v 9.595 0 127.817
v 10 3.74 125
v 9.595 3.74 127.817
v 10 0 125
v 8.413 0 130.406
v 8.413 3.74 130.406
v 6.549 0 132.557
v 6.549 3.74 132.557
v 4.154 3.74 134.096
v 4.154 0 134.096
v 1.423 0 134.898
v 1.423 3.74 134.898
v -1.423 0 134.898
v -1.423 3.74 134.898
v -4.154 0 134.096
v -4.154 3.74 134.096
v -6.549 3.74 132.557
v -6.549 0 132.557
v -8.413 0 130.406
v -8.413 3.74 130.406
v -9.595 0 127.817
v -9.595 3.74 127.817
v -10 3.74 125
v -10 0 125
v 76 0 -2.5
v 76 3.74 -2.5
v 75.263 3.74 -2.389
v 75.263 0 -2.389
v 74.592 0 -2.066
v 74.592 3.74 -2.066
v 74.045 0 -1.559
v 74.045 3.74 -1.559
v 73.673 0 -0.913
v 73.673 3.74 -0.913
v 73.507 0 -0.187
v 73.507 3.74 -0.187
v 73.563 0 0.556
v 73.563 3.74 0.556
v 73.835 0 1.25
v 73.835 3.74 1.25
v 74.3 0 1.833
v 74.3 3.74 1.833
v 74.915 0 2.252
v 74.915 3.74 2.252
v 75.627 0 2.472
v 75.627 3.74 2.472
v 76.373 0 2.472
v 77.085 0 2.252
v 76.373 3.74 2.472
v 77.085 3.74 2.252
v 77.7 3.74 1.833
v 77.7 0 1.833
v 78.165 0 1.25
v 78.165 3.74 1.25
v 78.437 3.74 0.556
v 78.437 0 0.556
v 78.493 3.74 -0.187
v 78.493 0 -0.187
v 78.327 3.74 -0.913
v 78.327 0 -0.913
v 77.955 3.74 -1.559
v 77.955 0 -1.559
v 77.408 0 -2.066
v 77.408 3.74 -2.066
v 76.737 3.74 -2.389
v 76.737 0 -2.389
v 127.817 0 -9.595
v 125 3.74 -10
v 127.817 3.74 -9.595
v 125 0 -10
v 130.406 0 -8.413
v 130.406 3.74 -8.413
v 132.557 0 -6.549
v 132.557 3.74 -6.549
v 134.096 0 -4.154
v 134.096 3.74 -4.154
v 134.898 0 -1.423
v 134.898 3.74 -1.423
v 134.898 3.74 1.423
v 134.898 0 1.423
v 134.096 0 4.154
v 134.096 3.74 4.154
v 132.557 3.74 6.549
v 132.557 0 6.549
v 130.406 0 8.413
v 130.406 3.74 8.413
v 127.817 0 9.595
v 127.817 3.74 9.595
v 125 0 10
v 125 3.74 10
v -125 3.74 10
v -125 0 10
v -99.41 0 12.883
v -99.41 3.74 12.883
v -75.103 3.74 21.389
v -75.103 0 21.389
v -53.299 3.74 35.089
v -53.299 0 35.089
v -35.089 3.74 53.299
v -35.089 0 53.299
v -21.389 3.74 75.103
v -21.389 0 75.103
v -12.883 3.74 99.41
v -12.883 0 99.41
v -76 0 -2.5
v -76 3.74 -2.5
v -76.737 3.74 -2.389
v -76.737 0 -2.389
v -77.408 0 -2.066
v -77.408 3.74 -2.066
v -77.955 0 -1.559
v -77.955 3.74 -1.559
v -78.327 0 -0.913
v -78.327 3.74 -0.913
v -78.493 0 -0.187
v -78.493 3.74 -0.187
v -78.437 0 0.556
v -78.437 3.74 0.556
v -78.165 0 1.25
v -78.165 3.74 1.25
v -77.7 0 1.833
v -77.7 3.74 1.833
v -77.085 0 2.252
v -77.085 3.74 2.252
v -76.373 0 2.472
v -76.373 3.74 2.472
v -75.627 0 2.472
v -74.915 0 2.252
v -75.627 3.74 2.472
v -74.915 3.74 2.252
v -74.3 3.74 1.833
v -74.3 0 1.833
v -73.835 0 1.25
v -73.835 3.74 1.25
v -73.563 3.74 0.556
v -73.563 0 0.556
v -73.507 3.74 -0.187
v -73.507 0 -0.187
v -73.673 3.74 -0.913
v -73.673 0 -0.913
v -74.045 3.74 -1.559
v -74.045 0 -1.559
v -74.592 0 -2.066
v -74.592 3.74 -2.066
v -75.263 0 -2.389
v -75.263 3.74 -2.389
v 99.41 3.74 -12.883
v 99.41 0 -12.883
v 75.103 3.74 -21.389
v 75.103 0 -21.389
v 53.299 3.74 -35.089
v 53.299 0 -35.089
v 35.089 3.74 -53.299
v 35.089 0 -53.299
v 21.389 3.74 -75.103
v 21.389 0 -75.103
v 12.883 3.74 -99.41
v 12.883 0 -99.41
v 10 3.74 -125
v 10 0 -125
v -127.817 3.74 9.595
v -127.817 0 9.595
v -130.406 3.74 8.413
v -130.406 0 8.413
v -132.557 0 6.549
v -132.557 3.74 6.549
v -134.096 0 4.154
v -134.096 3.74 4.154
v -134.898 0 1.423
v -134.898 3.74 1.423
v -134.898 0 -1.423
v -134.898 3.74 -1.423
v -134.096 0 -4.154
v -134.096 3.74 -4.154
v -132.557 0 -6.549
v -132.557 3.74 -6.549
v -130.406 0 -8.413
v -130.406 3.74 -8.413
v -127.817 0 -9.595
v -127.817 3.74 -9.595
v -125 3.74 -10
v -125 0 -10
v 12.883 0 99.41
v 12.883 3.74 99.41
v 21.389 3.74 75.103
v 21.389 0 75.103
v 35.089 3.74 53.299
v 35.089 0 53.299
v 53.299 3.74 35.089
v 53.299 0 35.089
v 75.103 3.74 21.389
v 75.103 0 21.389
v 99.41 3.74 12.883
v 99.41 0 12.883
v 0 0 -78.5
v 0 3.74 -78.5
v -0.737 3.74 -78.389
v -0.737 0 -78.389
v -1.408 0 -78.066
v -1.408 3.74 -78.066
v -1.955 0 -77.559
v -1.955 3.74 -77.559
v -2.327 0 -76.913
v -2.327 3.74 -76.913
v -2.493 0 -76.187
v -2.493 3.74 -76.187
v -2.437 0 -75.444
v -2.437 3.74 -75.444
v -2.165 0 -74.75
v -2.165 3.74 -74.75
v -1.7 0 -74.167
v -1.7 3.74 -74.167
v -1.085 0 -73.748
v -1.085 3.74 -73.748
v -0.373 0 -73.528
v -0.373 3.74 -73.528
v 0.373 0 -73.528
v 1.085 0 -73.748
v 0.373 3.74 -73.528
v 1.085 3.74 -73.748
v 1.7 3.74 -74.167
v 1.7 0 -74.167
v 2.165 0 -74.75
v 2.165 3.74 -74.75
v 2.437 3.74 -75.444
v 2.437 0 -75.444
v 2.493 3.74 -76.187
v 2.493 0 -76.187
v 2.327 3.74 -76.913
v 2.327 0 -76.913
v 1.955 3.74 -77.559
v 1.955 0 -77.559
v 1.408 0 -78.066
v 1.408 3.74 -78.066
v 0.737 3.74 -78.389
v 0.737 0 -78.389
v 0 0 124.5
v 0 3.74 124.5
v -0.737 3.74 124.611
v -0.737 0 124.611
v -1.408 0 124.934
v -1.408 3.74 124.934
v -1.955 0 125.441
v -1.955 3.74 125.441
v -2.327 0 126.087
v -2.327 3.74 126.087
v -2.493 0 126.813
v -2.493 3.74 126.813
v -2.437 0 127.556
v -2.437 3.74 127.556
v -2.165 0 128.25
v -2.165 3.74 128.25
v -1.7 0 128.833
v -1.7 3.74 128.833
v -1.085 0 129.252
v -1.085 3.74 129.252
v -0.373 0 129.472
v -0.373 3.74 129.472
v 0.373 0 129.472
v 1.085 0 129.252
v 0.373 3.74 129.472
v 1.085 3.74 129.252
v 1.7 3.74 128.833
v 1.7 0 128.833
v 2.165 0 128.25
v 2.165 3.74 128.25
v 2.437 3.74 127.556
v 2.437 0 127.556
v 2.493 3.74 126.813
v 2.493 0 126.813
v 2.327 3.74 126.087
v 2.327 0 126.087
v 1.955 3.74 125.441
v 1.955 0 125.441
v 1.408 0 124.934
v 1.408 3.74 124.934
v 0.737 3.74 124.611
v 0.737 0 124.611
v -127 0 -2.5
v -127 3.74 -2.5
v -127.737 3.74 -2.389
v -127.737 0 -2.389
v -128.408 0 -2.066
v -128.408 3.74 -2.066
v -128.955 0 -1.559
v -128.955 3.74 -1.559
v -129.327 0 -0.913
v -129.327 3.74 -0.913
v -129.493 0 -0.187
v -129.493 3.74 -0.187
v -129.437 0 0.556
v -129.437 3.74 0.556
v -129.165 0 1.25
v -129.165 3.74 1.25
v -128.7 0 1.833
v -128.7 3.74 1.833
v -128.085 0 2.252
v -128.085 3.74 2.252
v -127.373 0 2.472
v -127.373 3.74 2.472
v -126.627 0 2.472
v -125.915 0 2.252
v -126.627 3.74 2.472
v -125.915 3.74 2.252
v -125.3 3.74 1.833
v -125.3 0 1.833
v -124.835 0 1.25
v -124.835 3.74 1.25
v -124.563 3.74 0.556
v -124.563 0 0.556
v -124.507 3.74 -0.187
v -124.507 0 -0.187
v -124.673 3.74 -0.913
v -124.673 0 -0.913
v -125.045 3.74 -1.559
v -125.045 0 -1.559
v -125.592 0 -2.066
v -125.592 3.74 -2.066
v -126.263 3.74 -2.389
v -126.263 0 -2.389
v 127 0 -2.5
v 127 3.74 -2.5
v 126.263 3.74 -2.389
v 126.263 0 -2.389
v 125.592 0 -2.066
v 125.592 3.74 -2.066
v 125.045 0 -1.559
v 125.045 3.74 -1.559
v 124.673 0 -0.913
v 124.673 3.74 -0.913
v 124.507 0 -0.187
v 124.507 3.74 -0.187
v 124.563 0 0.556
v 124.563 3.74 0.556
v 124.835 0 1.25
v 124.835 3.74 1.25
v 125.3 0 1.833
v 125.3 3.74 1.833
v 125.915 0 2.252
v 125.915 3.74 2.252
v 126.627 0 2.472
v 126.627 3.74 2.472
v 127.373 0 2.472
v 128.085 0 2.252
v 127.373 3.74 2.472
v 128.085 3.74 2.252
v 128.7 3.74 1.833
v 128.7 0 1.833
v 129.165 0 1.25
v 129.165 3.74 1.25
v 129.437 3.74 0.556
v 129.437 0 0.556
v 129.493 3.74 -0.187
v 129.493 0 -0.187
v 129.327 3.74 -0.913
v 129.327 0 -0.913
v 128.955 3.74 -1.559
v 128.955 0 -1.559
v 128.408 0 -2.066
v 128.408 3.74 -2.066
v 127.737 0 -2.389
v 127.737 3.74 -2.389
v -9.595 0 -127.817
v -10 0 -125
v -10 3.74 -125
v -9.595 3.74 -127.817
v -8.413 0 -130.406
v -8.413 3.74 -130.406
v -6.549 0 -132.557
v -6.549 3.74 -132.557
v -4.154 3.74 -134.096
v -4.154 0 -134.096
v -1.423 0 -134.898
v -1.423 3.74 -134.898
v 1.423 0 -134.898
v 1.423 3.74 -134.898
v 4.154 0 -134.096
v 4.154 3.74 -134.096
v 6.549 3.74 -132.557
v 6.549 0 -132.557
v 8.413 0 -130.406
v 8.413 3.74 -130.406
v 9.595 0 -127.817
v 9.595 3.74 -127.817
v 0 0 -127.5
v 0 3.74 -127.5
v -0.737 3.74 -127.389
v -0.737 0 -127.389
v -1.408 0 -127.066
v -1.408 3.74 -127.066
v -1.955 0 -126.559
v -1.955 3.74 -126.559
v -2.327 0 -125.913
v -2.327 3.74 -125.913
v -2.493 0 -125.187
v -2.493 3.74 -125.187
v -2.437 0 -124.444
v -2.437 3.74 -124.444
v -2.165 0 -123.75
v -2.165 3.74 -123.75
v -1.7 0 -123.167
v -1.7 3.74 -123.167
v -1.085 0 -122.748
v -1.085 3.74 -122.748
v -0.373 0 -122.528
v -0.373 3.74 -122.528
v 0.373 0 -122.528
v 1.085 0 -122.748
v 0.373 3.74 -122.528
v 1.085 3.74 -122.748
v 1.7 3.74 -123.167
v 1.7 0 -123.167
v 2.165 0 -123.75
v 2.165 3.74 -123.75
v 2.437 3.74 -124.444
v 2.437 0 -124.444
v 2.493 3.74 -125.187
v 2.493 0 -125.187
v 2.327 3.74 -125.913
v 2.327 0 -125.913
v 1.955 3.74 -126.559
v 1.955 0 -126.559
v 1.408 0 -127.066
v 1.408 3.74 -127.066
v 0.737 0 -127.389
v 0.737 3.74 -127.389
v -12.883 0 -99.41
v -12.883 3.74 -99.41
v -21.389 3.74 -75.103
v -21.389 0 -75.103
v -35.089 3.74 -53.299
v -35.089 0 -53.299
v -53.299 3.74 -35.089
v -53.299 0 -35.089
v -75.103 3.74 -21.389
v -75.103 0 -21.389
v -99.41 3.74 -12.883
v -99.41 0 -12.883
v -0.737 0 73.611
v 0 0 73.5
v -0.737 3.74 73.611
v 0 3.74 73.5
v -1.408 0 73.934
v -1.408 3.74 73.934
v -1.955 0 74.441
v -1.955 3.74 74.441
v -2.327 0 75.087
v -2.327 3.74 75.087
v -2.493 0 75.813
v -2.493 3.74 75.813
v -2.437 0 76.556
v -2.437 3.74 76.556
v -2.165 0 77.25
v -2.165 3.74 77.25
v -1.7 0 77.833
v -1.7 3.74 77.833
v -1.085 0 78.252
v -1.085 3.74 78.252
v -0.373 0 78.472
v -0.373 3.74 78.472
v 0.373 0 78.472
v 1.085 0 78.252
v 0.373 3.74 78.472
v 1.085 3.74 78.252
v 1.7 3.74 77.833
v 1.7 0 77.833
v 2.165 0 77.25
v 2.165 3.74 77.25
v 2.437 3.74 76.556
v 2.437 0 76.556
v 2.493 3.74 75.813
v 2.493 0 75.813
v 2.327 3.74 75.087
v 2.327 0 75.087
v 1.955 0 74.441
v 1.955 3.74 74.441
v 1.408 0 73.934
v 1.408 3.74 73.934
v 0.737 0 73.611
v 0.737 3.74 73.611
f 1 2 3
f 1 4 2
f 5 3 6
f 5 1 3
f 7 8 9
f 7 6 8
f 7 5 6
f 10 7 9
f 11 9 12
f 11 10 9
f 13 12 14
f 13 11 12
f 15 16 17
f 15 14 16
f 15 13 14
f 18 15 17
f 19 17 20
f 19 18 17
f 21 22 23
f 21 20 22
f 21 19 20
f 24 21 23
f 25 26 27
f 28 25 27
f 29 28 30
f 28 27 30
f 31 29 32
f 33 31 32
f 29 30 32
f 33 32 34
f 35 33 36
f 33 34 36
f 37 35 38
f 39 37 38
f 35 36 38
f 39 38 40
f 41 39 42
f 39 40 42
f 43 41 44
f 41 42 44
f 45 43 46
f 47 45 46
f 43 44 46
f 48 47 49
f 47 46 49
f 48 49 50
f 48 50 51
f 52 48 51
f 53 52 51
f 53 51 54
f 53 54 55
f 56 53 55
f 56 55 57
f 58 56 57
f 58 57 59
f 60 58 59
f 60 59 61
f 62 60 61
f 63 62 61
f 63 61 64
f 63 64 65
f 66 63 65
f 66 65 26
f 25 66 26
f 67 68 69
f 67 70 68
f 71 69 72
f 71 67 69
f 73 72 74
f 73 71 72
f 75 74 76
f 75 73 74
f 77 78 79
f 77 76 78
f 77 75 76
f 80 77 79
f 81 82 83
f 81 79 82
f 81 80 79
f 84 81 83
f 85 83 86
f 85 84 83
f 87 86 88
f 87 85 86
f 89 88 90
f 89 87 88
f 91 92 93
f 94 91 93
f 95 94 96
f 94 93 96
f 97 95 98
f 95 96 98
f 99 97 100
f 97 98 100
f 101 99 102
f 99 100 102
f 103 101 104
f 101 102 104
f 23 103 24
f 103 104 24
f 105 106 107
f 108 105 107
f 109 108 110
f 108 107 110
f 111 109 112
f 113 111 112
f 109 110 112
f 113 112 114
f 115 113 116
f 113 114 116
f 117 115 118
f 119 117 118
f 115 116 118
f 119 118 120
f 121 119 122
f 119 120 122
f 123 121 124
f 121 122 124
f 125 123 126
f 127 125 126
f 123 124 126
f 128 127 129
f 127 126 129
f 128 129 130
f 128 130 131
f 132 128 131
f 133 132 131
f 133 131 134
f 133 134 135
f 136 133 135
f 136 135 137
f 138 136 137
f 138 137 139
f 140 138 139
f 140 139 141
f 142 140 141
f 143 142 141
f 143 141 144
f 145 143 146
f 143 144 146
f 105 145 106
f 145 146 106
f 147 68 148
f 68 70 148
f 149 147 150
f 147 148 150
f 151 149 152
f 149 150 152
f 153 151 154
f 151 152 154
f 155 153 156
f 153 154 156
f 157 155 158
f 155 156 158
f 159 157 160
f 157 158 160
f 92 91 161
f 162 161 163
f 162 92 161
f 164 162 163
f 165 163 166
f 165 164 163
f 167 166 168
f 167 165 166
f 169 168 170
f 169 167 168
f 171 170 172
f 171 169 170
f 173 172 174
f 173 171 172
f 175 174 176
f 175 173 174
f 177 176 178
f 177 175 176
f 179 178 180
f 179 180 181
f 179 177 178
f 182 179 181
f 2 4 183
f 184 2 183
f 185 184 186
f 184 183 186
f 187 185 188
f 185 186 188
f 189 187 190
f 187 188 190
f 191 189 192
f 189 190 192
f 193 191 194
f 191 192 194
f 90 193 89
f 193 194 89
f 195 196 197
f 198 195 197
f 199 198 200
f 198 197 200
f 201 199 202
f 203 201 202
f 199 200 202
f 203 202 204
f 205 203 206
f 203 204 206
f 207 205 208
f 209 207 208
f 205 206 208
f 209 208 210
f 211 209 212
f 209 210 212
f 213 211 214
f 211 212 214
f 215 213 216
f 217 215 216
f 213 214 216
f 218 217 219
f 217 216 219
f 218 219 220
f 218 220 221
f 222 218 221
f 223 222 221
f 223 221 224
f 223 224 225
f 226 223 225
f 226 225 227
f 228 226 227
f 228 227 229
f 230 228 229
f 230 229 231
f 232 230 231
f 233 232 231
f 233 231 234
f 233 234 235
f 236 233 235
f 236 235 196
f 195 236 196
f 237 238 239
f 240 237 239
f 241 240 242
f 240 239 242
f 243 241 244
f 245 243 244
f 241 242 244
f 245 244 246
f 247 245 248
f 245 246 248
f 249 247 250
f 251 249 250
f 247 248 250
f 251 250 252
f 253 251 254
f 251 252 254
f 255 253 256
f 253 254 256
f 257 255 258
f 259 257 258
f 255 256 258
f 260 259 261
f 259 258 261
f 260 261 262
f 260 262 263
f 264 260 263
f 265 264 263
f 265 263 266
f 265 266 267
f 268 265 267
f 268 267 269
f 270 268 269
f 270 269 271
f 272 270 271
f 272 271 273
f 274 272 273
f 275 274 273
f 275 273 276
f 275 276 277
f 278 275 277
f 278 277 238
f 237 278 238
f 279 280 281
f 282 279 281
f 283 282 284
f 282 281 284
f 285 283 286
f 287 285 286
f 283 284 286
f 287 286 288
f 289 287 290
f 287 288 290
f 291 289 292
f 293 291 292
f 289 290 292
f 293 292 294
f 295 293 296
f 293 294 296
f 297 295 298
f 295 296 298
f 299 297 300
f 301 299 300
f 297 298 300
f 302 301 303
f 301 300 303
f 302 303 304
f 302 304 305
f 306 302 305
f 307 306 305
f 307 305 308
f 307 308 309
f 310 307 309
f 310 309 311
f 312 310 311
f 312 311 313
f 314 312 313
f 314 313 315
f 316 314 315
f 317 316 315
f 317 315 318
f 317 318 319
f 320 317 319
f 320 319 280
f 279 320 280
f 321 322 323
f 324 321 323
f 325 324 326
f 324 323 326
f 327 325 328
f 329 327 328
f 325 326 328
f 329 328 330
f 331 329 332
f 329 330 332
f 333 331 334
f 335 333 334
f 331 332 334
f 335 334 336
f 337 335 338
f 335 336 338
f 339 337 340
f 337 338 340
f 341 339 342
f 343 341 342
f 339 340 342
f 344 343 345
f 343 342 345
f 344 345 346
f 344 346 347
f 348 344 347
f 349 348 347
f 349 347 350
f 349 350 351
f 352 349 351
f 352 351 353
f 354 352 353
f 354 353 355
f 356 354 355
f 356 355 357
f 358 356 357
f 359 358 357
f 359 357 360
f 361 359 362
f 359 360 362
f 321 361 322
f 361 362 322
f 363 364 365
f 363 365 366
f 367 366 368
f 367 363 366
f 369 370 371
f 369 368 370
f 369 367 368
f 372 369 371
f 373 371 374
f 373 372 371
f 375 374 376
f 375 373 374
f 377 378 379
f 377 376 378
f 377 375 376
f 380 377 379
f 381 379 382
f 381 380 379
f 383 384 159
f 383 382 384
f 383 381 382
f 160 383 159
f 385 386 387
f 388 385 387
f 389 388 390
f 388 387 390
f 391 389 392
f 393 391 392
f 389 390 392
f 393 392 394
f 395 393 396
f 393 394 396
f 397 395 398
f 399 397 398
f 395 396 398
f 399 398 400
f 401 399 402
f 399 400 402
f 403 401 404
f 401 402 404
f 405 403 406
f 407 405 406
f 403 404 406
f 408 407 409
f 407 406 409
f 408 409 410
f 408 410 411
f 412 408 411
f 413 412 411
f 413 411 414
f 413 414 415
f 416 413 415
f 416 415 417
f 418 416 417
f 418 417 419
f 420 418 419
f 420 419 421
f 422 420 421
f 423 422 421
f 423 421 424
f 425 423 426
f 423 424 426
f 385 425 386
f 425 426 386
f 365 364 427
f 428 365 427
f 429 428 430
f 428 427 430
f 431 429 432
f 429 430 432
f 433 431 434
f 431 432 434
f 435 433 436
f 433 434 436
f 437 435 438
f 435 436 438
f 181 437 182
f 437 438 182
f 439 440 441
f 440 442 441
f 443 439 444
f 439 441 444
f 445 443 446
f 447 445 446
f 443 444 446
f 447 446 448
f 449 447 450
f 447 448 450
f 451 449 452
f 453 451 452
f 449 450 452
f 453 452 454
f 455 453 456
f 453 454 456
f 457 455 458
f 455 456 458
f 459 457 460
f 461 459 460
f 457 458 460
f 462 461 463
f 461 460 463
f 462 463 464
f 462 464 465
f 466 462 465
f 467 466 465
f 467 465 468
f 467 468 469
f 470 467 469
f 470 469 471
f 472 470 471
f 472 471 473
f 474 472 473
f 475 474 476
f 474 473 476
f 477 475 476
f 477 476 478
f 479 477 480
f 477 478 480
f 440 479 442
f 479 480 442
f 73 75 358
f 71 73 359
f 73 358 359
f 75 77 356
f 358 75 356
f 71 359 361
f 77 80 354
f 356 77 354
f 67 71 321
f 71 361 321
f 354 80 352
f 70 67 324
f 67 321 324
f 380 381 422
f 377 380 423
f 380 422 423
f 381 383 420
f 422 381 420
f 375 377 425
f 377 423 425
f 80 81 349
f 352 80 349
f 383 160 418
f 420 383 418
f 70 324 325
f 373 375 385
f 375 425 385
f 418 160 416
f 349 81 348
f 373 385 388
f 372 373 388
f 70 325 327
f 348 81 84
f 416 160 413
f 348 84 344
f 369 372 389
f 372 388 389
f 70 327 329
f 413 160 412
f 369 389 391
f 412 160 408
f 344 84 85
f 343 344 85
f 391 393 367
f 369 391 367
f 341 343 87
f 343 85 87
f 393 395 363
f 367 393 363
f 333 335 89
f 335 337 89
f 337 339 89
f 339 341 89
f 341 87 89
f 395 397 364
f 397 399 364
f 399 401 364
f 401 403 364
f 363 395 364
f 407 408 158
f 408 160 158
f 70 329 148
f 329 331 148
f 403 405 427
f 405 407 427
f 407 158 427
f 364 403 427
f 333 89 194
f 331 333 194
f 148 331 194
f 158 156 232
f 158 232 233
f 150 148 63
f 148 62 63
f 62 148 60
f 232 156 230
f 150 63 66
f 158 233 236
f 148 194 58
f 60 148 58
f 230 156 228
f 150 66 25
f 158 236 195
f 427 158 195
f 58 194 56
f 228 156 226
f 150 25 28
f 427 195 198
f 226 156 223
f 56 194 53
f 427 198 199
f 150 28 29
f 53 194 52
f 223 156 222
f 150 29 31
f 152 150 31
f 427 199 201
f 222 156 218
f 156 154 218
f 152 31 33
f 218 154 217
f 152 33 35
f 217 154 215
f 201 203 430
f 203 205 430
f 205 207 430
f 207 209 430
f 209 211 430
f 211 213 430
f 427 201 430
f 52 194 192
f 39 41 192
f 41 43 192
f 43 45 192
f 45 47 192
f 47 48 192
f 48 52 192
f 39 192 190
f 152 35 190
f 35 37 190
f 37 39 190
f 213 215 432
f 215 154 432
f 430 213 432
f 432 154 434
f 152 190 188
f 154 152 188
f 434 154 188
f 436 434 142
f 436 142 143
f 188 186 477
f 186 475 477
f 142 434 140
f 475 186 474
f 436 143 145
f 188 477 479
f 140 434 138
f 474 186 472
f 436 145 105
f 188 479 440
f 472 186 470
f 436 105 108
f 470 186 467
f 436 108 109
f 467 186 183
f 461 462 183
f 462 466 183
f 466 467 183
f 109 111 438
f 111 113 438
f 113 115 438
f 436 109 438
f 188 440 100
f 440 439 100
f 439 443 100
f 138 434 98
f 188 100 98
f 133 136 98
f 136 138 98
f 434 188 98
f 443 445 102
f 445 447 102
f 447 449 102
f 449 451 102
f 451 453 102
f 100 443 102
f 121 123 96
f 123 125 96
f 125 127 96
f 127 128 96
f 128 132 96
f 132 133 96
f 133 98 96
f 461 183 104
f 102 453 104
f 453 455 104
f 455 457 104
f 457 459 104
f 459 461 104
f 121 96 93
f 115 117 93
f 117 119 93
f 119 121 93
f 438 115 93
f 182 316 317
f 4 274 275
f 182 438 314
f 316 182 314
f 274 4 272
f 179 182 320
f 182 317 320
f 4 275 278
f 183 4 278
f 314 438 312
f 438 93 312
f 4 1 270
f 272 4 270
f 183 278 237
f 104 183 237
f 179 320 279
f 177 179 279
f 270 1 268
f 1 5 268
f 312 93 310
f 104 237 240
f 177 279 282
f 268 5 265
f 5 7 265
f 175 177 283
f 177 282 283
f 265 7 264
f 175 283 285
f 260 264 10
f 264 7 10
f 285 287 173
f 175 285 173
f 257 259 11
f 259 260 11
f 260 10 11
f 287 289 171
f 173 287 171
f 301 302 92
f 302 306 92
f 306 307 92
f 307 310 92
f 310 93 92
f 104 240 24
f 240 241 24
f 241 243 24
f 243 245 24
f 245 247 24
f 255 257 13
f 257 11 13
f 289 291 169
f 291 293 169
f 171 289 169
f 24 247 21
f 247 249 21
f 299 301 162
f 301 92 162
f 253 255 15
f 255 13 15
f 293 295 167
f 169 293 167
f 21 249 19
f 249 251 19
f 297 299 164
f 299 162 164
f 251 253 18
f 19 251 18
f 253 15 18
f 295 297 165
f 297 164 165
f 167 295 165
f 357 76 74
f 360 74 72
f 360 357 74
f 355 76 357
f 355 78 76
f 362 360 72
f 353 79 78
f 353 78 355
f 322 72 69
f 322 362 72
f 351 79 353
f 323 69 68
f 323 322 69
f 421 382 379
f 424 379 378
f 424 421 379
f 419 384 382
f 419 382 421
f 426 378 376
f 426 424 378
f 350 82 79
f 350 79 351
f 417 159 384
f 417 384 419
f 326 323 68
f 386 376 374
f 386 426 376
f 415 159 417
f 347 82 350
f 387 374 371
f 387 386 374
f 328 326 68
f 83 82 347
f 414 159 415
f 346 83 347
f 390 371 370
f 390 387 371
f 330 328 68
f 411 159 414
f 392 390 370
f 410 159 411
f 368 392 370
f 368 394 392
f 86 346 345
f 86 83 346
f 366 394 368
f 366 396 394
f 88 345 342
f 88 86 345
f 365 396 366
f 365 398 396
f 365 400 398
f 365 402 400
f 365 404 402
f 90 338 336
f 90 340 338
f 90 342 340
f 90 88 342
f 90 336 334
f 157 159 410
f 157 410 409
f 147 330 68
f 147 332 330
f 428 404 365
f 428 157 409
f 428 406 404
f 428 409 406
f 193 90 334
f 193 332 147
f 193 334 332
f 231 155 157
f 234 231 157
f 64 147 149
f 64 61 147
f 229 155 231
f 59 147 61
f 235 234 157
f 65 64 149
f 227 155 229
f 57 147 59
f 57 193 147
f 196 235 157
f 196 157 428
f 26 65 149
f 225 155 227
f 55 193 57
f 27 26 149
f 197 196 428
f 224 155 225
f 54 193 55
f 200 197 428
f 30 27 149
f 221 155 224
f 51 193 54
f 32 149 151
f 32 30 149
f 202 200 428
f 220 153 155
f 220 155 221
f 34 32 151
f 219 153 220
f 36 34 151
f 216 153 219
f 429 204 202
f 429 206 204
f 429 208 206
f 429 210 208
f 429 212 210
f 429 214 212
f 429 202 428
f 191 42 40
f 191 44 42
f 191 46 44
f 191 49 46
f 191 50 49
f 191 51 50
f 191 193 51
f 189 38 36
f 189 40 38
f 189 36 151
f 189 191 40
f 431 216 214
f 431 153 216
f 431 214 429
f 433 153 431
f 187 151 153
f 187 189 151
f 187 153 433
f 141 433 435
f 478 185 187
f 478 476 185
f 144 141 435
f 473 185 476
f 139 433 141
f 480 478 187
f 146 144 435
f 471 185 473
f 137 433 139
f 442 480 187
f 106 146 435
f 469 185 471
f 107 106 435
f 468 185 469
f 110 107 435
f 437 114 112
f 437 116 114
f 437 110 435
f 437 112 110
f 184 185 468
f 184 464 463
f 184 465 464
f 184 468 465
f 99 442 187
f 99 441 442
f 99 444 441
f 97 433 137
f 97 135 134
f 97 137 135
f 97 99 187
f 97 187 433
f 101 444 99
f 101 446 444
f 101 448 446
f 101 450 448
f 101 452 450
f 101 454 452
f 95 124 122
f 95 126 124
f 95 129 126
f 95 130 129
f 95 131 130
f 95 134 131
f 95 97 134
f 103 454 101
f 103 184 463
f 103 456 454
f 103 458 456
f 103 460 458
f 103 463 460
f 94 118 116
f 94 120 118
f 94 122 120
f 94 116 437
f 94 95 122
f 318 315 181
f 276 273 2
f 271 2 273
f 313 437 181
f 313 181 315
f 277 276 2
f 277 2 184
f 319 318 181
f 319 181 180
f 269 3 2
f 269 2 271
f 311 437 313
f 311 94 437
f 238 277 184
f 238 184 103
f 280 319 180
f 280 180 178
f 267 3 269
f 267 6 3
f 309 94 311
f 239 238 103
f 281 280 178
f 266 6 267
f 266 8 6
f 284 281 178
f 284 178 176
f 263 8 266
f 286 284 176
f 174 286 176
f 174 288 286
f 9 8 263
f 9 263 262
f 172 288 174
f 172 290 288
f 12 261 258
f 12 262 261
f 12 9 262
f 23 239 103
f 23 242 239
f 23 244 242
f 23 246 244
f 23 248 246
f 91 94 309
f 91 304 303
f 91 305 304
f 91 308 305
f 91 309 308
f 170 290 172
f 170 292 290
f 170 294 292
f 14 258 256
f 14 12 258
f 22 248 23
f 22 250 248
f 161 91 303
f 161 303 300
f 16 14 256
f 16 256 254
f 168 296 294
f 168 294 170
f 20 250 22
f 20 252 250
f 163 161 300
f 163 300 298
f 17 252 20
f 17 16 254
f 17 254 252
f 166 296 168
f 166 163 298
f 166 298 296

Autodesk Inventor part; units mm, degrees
ref_plane "YZ Plane" through (0, 0, 0) normal (1, 0, 0) x (0, 1, 0)
ref_plane "XZ Plane" through (0, 0, 0) normal (0, 1, 0) x (-1, 0, 0)
ref_plane "XY Plane" through (0, 0, 0) normal (0, 0, 1) x (1, 0, 0)
sketch "Szkic1" plane through (0, 0, 0) normal (0, 1, 0) x (-1, 0, 0)
  line L0 (0, 0) -> (0, -135)
  line L1 (0, 0) -> (-135, 0)
  arc A0 (-10, -125) -> (0, -135) centre (0, -125) ccw
  arc A1 (-135, 0) -> (-125, -10) centre (-125, 0) ccw
  arc A2 (-10, -125) -> (-125, -10) centre (-125, -125) ccw
  line L2 (0, 0) -> (135, 0)
  arc A3 (0, -135) -> (10, -125) centre (0, -125) ccw
  arc A4 (125, -10) -> (135, 0) centre (125, 0) ccw
  arc A5 (125, -10) -> (10, -125) centre (125, -125) ccw
  line L3 (0, 0) -> (0, 135)
  arc A6 (0, 135) -> (-10, 125) centre (0, 125) ccw
  arc A7 (-125, 10) -> (-135, 0) centre (-125, 0) ccw
  arc A8 (-125, 10) -> (-10, 125) centre (-125, 125) ccw
  arc A9 (10, 125) -> (0, 135) centre (0, 125) ccw
  arc A10 (135, 0) -> (125, 10) centre (125, 0) ccw
  arc A11 (10, 125) -> (125, 10) centre (125, 125) ccw
  circle A12 centre (-127, 0) radius 2.5
  circle A13 centre (-76, 0) radius 2.5
  circle A14 centre (0, 127) radius 2.5
  circle A15 centre (0, 76) radius 2.5
  circle A16 centre (0, -127) radius 2.5
  circle A17 centre (0, -76) radius 2.5
  circle A18 centre (127, 0) radius 2.5
  circle A19 centre (76, 0) radius 2.5
  dimension "d13" = 135
  dimension "d14" = 135
  dimension "d15" = 20
  dimension "d16" = 20
  dimension "d17" = 115
  dimension "d18" = 125
  dimension "sruba" = 5
  dimension "d20" = 8
  dimension "d21" = 5
  dimension "d22" = 51
  dimension "d23" = 5
  dimension "d24" = 5
  dimension "d25" = 8
  dimension "d26" = 51
extrude "Wyciągnięcie proste1" add sketch "Szkic1" along normal blind 3.74
sketch "Szkic2" plane through (0, 0, 0) normal (0, -1, 0) x (1, 0, 0)
  arc A0 (-10, -125) -> (10, -125) centre (0, -125) ccw projected
  circle A1 centre (-127, 0) radius 2.5 projected
  circle A2 centre (-76, 0) radius 2.5 projected
  circle A3 centre (76, 0) radius 2.5 projected
  circle A4 centre (127, 0) radius 2.5 projected
  circle A5 centre (0, -76) radius 2.5 projected
  circle A6 centre (0, 76) radius 2.5 projected
  circle A7 centre (0, 127) radius 2.5 projected
  circle A8 centre (0, -127) radius 2.5 projected
  point P0 (0, 0)
hole "Otwór1" at (0, 0, 127) at (0, 0, 76) at (-127, 0, 0) at (-76, 0, 0) at (0, 0, -76) at (0, 0, -125) at (76, 0, 0) at (127, 0, 0) direction (0, 1, 0) diameter 5 depth 8 tip angle 118
equation "\"d14\" = d13"
equation "\"d16\" = d15"
equation "\"d21\" = sruba"
equation "\"d23\" = sruba"
equation "\"d24\" = sruba"
equation "\"d25\" = d20"
equation "\"d26\" = d22"
equation "\"d27\" = sruba"
properties part number "Podstawa" material "Tworzywo sztuczne ABS"
